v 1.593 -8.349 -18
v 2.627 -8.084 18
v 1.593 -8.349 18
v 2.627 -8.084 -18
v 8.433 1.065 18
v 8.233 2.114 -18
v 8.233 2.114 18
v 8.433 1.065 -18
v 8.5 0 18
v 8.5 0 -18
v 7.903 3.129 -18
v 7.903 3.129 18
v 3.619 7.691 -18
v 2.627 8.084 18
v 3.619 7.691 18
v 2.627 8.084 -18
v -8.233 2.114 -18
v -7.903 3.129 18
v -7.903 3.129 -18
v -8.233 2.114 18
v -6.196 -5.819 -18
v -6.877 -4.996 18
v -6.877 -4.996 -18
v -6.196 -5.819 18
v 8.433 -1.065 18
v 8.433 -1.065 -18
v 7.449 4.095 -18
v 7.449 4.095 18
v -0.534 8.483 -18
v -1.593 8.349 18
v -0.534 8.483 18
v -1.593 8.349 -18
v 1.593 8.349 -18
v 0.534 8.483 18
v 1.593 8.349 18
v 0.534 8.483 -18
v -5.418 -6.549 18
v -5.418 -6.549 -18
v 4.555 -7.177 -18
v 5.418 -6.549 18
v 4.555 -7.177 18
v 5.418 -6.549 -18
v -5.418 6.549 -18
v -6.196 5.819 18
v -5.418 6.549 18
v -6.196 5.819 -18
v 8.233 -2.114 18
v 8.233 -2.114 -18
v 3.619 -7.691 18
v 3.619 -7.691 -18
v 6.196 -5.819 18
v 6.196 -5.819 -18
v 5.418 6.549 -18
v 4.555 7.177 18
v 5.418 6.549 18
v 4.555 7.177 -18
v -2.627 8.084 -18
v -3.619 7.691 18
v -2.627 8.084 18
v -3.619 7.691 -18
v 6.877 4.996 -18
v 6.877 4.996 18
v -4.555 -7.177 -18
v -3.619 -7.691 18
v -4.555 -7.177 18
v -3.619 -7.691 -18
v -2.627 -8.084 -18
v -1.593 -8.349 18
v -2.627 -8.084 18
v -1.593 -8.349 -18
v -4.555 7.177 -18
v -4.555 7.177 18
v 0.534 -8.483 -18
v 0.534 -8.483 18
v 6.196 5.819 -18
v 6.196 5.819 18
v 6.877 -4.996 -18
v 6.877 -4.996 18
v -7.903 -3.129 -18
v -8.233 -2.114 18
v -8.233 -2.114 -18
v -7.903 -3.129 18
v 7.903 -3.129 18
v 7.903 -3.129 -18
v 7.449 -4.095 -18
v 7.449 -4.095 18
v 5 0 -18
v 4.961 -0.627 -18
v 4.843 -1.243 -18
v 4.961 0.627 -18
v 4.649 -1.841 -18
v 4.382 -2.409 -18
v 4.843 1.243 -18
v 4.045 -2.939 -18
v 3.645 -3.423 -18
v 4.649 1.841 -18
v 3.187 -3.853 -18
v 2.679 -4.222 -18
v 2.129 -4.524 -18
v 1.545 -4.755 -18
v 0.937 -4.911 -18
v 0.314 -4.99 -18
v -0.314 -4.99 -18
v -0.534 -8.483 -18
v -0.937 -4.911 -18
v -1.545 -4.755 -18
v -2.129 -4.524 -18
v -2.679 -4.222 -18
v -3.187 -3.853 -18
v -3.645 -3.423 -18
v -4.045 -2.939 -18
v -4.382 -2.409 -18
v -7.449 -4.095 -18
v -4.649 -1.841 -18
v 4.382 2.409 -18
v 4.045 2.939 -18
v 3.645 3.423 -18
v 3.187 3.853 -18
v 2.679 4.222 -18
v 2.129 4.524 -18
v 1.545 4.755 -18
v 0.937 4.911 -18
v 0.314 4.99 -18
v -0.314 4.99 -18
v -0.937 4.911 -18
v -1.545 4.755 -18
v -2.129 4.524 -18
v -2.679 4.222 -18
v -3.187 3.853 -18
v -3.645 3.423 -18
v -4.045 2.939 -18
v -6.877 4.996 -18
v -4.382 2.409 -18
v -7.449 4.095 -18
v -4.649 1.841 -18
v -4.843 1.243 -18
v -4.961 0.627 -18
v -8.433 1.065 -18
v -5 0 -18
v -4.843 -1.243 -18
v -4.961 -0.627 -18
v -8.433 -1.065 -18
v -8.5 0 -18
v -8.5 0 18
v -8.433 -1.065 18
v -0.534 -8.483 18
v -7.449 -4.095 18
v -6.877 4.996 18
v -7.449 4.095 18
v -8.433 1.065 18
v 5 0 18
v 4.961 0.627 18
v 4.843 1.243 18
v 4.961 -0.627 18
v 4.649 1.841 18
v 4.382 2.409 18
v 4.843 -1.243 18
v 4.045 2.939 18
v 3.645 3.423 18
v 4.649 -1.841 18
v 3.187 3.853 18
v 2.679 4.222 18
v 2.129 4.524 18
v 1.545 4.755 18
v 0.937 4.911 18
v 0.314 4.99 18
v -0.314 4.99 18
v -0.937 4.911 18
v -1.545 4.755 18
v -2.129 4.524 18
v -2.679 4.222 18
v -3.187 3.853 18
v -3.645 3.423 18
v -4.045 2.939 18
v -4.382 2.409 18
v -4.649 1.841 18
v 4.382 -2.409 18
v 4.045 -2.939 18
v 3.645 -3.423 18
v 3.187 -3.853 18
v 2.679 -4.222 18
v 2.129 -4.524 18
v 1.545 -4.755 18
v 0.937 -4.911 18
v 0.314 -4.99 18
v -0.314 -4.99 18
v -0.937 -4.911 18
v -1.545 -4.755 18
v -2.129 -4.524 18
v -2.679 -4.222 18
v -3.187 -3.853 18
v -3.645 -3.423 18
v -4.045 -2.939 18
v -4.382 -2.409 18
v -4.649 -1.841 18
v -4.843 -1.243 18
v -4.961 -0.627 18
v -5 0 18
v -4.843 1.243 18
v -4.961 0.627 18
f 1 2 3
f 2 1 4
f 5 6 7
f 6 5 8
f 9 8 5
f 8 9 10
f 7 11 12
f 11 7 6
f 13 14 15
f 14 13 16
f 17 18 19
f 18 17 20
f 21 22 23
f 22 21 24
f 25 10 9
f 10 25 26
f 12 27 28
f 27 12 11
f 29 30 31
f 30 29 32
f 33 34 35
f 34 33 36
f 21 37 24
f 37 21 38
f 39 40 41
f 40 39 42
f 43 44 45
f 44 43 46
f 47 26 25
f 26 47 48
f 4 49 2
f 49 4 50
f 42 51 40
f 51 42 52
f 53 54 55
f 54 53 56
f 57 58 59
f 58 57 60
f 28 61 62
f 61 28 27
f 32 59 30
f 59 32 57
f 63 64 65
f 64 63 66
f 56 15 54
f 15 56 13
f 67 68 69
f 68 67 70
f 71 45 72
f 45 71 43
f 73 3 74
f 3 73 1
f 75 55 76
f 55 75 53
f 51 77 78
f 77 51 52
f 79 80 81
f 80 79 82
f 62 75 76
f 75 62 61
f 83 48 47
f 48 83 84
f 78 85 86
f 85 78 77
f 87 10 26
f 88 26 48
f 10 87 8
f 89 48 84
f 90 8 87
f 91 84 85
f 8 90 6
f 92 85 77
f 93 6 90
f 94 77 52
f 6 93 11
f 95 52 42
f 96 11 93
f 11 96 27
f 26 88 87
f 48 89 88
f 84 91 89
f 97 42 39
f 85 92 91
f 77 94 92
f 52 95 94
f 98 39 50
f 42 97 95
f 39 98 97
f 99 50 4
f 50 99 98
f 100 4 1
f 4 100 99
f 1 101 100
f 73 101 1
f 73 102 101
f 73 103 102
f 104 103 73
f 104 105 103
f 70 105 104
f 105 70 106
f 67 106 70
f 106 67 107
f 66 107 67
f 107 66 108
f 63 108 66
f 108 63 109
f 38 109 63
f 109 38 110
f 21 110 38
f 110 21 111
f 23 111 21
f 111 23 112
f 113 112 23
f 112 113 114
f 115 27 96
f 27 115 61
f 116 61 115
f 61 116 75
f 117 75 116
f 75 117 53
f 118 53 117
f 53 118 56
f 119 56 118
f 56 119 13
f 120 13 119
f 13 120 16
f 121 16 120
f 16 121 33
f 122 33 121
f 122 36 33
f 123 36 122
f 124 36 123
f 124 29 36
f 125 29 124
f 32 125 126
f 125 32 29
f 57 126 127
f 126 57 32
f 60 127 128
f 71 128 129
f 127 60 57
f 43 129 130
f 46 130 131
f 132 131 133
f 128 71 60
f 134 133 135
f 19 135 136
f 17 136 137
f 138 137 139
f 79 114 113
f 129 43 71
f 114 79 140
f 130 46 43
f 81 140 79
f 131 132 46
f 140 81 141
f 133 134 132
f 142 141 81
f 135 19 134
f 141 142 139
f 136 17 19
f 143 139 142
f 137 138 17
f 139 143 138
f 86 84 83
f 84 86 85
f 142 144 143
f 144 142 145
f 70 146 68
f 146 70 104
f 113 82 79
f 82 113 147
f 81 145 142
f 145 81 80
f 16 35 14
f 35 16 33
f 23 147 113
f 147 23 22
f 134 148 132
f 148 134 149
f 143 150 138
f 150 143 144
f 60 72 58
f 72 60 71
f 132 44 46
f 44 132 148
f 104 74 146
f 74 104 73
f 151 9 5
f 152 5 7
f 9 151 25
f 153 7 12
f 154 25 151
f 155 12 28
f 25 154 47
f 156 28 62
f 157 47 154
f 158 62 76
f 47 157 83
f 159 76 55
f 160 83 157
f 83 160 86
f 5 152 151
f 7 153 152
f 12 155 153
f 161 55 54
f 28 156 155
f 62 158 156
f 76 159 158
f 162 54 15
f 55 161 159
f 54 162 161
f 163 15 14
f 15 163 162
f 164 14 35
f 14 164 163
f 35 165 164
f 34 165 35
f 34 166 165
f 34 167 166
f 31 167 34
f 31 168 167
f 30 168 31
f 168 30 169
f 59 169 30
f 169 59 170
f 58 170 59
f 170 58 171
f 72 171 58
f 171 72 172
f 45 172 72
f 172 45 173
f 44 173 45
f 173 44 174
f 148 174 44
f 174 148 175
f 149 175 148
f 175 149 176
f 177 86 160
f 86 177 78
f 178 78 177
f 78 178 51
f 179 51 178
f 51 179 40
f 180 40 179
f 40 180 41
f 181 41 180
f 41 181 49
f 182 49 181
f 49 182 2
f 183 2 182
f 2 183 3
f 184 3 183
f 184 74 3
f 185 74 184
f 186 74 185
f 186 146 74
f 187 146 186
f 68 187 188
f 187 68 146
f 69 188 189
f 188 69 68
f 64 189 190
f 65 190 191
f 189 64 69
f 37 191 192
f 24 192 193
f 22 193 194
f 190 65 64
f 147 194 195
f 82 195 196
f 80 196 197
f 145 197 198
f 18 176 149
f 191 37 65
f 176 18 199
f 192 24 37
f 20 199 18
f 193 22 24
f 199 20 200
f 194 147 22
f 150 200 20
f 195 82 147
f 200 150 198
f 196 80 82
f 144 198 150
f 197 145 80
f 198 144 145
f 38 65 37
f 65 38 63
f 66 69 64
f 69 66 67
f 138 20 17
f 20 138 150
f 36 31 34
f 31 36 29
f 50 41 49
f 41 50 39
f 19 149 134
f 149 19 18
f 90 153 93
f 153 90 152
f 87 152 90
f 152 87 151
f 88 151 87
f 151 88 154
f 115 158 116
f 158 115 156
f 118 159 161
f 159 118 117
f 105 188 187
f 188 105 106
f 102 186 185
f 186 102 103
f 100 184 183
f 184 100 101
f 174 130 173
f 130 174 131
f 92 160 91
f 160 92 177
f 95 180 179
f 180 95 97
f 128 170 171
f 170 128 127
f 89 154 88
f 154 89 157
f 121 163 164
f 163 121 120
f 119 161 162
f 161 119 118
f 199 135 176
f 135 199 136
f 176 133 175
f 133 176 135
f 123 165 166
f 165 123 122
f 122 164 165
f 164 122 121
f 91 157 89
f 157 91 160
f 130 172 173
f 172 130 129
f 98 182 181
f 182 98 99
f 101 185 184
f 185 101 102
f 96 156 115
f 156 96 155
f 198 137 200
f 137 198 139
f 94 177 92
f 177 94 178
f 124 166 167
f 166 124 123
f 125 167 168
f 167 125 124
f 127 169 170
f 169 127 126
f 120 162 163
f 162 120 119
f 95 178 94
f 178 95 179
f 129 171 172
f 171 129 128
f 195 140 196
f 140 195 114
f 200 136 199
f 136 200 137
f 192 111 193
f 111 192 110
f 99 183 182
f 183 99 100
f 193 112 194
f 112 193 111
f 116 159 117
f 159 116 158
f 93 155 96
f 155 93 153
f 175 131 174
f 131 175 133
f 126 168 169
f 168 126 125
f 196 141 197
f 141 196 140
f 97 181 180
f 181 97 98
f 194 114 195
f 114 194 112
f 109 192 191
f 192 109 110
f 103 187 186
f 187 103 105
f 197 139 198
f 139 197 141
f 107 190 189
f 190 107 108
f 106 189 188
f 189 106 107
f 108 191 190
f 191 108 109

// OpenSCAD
$fn = 50;


difference() {
	union() {
		translate(v = [0, 0, -18.0000000000]) {
			cylinder(h = 36, r = 8.5000000000);
		}
	}
	union() {
		translate(v = [0, 0, -100.0000000000]) {
			cylinder(h = 200, r = 5.0000000000);
		}
	}
}
